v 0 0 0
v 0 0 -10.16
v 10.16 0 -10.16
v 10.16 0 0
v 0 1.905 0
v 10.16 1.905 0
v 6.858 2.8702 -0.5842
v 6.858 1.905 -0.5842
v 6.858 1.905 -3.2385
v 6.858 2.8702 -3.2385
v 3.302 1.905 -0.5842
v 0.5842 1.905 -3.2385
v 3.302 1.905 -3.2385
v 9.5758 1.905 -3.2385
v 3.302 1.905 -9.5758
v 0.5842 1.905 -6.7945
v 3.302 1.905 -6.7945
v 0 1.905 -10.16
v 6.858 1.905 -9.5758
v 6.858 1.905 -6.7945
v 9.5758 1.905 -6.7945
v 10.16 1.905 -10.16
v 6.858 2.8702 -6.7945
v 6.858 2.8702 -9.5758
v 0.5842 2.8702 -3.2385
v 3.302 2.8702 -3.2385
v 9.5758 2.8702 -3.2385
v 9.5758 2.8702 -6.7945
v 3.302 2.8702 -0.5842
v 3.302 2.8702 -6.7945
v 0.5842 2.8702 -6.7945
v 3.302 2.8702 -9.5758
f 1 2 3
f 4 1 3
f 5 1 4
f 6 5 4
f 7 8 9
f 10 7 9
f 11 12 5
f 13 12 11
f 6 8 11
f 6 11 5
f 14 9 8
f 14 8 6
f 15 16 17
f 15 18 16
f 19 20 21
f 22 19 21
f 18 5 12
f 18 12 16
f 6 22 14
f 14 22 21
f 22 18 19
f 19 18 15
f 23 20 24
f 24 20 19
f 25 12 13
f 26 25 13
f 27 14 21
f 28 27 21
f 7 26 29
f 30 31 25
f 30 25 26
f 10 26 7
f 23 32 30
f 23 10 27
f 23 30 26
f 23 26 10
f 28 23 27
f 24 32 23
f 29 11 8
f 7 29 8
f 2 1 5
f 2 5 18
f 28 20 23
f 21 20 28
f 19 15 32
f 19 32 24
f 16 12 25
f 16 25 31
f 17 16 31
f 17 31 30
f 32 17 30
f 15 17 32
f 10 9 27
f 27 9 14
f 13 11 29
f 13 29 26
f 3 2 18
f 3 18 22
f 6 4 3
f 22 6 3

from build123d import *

# Parameters (mm, degrees)
SKETCH1_W           = 10.16
SKETCH1_H           = 10.16
BOSS_EXTRUDE1_DEPTH = 1.905
SKETCH2_W           = 3.556
SKETCH2_H           = 8.9916
BOSS_EXTRUDE4_DEPTH = 2.8702
SKETCH4_W           = 8.9916
SKETCH4_H           = 3.556
BOSS_EXTRUDE5_DEPTH = 2.8702


with BuildPart() as part:
    # Sketch1 → Boss-Extrude1 (new body)
    with BuildSketch(Plane(origin=(0, 0, 0), x_dir=(1, 0, 0), z_dir=(0, 1, 0))):
        with Locations((5.08, 5.08)):
            Rectangle(SKETCH1_W, SKETCH1_H)
    extrude(amount=BOSS_EXTRUDE1_DEPTH)

    # Sketch2 → Boss-Extrude4 (add)
    with BuildSketch(Plane(origin=(0, 0, 0), x_dir=(1, 0, 0), z_dir=(0, 1, 0))):
        with Locations((5.08, 5.08)):
            Rectangle(SKETCH2_W, SKETCH2_H)
    extrude(amount=BOSS_EXTRUDE4_DEPTH)

    # Sketch4 → Boss-Extrude5 (add)
    with BuildSketch(Plane(origin=(0, 0, 0), x_dir=(1, 0, 0), z_dir=(0, 1, 0))):
        with Locations((5.08, 5.0165)):
            Rectangle(SKETCH4_W, SKETCH4_H)
    extrude(amount=BOSS_EXTRUDE5_DEPTH)


solid = part.part
